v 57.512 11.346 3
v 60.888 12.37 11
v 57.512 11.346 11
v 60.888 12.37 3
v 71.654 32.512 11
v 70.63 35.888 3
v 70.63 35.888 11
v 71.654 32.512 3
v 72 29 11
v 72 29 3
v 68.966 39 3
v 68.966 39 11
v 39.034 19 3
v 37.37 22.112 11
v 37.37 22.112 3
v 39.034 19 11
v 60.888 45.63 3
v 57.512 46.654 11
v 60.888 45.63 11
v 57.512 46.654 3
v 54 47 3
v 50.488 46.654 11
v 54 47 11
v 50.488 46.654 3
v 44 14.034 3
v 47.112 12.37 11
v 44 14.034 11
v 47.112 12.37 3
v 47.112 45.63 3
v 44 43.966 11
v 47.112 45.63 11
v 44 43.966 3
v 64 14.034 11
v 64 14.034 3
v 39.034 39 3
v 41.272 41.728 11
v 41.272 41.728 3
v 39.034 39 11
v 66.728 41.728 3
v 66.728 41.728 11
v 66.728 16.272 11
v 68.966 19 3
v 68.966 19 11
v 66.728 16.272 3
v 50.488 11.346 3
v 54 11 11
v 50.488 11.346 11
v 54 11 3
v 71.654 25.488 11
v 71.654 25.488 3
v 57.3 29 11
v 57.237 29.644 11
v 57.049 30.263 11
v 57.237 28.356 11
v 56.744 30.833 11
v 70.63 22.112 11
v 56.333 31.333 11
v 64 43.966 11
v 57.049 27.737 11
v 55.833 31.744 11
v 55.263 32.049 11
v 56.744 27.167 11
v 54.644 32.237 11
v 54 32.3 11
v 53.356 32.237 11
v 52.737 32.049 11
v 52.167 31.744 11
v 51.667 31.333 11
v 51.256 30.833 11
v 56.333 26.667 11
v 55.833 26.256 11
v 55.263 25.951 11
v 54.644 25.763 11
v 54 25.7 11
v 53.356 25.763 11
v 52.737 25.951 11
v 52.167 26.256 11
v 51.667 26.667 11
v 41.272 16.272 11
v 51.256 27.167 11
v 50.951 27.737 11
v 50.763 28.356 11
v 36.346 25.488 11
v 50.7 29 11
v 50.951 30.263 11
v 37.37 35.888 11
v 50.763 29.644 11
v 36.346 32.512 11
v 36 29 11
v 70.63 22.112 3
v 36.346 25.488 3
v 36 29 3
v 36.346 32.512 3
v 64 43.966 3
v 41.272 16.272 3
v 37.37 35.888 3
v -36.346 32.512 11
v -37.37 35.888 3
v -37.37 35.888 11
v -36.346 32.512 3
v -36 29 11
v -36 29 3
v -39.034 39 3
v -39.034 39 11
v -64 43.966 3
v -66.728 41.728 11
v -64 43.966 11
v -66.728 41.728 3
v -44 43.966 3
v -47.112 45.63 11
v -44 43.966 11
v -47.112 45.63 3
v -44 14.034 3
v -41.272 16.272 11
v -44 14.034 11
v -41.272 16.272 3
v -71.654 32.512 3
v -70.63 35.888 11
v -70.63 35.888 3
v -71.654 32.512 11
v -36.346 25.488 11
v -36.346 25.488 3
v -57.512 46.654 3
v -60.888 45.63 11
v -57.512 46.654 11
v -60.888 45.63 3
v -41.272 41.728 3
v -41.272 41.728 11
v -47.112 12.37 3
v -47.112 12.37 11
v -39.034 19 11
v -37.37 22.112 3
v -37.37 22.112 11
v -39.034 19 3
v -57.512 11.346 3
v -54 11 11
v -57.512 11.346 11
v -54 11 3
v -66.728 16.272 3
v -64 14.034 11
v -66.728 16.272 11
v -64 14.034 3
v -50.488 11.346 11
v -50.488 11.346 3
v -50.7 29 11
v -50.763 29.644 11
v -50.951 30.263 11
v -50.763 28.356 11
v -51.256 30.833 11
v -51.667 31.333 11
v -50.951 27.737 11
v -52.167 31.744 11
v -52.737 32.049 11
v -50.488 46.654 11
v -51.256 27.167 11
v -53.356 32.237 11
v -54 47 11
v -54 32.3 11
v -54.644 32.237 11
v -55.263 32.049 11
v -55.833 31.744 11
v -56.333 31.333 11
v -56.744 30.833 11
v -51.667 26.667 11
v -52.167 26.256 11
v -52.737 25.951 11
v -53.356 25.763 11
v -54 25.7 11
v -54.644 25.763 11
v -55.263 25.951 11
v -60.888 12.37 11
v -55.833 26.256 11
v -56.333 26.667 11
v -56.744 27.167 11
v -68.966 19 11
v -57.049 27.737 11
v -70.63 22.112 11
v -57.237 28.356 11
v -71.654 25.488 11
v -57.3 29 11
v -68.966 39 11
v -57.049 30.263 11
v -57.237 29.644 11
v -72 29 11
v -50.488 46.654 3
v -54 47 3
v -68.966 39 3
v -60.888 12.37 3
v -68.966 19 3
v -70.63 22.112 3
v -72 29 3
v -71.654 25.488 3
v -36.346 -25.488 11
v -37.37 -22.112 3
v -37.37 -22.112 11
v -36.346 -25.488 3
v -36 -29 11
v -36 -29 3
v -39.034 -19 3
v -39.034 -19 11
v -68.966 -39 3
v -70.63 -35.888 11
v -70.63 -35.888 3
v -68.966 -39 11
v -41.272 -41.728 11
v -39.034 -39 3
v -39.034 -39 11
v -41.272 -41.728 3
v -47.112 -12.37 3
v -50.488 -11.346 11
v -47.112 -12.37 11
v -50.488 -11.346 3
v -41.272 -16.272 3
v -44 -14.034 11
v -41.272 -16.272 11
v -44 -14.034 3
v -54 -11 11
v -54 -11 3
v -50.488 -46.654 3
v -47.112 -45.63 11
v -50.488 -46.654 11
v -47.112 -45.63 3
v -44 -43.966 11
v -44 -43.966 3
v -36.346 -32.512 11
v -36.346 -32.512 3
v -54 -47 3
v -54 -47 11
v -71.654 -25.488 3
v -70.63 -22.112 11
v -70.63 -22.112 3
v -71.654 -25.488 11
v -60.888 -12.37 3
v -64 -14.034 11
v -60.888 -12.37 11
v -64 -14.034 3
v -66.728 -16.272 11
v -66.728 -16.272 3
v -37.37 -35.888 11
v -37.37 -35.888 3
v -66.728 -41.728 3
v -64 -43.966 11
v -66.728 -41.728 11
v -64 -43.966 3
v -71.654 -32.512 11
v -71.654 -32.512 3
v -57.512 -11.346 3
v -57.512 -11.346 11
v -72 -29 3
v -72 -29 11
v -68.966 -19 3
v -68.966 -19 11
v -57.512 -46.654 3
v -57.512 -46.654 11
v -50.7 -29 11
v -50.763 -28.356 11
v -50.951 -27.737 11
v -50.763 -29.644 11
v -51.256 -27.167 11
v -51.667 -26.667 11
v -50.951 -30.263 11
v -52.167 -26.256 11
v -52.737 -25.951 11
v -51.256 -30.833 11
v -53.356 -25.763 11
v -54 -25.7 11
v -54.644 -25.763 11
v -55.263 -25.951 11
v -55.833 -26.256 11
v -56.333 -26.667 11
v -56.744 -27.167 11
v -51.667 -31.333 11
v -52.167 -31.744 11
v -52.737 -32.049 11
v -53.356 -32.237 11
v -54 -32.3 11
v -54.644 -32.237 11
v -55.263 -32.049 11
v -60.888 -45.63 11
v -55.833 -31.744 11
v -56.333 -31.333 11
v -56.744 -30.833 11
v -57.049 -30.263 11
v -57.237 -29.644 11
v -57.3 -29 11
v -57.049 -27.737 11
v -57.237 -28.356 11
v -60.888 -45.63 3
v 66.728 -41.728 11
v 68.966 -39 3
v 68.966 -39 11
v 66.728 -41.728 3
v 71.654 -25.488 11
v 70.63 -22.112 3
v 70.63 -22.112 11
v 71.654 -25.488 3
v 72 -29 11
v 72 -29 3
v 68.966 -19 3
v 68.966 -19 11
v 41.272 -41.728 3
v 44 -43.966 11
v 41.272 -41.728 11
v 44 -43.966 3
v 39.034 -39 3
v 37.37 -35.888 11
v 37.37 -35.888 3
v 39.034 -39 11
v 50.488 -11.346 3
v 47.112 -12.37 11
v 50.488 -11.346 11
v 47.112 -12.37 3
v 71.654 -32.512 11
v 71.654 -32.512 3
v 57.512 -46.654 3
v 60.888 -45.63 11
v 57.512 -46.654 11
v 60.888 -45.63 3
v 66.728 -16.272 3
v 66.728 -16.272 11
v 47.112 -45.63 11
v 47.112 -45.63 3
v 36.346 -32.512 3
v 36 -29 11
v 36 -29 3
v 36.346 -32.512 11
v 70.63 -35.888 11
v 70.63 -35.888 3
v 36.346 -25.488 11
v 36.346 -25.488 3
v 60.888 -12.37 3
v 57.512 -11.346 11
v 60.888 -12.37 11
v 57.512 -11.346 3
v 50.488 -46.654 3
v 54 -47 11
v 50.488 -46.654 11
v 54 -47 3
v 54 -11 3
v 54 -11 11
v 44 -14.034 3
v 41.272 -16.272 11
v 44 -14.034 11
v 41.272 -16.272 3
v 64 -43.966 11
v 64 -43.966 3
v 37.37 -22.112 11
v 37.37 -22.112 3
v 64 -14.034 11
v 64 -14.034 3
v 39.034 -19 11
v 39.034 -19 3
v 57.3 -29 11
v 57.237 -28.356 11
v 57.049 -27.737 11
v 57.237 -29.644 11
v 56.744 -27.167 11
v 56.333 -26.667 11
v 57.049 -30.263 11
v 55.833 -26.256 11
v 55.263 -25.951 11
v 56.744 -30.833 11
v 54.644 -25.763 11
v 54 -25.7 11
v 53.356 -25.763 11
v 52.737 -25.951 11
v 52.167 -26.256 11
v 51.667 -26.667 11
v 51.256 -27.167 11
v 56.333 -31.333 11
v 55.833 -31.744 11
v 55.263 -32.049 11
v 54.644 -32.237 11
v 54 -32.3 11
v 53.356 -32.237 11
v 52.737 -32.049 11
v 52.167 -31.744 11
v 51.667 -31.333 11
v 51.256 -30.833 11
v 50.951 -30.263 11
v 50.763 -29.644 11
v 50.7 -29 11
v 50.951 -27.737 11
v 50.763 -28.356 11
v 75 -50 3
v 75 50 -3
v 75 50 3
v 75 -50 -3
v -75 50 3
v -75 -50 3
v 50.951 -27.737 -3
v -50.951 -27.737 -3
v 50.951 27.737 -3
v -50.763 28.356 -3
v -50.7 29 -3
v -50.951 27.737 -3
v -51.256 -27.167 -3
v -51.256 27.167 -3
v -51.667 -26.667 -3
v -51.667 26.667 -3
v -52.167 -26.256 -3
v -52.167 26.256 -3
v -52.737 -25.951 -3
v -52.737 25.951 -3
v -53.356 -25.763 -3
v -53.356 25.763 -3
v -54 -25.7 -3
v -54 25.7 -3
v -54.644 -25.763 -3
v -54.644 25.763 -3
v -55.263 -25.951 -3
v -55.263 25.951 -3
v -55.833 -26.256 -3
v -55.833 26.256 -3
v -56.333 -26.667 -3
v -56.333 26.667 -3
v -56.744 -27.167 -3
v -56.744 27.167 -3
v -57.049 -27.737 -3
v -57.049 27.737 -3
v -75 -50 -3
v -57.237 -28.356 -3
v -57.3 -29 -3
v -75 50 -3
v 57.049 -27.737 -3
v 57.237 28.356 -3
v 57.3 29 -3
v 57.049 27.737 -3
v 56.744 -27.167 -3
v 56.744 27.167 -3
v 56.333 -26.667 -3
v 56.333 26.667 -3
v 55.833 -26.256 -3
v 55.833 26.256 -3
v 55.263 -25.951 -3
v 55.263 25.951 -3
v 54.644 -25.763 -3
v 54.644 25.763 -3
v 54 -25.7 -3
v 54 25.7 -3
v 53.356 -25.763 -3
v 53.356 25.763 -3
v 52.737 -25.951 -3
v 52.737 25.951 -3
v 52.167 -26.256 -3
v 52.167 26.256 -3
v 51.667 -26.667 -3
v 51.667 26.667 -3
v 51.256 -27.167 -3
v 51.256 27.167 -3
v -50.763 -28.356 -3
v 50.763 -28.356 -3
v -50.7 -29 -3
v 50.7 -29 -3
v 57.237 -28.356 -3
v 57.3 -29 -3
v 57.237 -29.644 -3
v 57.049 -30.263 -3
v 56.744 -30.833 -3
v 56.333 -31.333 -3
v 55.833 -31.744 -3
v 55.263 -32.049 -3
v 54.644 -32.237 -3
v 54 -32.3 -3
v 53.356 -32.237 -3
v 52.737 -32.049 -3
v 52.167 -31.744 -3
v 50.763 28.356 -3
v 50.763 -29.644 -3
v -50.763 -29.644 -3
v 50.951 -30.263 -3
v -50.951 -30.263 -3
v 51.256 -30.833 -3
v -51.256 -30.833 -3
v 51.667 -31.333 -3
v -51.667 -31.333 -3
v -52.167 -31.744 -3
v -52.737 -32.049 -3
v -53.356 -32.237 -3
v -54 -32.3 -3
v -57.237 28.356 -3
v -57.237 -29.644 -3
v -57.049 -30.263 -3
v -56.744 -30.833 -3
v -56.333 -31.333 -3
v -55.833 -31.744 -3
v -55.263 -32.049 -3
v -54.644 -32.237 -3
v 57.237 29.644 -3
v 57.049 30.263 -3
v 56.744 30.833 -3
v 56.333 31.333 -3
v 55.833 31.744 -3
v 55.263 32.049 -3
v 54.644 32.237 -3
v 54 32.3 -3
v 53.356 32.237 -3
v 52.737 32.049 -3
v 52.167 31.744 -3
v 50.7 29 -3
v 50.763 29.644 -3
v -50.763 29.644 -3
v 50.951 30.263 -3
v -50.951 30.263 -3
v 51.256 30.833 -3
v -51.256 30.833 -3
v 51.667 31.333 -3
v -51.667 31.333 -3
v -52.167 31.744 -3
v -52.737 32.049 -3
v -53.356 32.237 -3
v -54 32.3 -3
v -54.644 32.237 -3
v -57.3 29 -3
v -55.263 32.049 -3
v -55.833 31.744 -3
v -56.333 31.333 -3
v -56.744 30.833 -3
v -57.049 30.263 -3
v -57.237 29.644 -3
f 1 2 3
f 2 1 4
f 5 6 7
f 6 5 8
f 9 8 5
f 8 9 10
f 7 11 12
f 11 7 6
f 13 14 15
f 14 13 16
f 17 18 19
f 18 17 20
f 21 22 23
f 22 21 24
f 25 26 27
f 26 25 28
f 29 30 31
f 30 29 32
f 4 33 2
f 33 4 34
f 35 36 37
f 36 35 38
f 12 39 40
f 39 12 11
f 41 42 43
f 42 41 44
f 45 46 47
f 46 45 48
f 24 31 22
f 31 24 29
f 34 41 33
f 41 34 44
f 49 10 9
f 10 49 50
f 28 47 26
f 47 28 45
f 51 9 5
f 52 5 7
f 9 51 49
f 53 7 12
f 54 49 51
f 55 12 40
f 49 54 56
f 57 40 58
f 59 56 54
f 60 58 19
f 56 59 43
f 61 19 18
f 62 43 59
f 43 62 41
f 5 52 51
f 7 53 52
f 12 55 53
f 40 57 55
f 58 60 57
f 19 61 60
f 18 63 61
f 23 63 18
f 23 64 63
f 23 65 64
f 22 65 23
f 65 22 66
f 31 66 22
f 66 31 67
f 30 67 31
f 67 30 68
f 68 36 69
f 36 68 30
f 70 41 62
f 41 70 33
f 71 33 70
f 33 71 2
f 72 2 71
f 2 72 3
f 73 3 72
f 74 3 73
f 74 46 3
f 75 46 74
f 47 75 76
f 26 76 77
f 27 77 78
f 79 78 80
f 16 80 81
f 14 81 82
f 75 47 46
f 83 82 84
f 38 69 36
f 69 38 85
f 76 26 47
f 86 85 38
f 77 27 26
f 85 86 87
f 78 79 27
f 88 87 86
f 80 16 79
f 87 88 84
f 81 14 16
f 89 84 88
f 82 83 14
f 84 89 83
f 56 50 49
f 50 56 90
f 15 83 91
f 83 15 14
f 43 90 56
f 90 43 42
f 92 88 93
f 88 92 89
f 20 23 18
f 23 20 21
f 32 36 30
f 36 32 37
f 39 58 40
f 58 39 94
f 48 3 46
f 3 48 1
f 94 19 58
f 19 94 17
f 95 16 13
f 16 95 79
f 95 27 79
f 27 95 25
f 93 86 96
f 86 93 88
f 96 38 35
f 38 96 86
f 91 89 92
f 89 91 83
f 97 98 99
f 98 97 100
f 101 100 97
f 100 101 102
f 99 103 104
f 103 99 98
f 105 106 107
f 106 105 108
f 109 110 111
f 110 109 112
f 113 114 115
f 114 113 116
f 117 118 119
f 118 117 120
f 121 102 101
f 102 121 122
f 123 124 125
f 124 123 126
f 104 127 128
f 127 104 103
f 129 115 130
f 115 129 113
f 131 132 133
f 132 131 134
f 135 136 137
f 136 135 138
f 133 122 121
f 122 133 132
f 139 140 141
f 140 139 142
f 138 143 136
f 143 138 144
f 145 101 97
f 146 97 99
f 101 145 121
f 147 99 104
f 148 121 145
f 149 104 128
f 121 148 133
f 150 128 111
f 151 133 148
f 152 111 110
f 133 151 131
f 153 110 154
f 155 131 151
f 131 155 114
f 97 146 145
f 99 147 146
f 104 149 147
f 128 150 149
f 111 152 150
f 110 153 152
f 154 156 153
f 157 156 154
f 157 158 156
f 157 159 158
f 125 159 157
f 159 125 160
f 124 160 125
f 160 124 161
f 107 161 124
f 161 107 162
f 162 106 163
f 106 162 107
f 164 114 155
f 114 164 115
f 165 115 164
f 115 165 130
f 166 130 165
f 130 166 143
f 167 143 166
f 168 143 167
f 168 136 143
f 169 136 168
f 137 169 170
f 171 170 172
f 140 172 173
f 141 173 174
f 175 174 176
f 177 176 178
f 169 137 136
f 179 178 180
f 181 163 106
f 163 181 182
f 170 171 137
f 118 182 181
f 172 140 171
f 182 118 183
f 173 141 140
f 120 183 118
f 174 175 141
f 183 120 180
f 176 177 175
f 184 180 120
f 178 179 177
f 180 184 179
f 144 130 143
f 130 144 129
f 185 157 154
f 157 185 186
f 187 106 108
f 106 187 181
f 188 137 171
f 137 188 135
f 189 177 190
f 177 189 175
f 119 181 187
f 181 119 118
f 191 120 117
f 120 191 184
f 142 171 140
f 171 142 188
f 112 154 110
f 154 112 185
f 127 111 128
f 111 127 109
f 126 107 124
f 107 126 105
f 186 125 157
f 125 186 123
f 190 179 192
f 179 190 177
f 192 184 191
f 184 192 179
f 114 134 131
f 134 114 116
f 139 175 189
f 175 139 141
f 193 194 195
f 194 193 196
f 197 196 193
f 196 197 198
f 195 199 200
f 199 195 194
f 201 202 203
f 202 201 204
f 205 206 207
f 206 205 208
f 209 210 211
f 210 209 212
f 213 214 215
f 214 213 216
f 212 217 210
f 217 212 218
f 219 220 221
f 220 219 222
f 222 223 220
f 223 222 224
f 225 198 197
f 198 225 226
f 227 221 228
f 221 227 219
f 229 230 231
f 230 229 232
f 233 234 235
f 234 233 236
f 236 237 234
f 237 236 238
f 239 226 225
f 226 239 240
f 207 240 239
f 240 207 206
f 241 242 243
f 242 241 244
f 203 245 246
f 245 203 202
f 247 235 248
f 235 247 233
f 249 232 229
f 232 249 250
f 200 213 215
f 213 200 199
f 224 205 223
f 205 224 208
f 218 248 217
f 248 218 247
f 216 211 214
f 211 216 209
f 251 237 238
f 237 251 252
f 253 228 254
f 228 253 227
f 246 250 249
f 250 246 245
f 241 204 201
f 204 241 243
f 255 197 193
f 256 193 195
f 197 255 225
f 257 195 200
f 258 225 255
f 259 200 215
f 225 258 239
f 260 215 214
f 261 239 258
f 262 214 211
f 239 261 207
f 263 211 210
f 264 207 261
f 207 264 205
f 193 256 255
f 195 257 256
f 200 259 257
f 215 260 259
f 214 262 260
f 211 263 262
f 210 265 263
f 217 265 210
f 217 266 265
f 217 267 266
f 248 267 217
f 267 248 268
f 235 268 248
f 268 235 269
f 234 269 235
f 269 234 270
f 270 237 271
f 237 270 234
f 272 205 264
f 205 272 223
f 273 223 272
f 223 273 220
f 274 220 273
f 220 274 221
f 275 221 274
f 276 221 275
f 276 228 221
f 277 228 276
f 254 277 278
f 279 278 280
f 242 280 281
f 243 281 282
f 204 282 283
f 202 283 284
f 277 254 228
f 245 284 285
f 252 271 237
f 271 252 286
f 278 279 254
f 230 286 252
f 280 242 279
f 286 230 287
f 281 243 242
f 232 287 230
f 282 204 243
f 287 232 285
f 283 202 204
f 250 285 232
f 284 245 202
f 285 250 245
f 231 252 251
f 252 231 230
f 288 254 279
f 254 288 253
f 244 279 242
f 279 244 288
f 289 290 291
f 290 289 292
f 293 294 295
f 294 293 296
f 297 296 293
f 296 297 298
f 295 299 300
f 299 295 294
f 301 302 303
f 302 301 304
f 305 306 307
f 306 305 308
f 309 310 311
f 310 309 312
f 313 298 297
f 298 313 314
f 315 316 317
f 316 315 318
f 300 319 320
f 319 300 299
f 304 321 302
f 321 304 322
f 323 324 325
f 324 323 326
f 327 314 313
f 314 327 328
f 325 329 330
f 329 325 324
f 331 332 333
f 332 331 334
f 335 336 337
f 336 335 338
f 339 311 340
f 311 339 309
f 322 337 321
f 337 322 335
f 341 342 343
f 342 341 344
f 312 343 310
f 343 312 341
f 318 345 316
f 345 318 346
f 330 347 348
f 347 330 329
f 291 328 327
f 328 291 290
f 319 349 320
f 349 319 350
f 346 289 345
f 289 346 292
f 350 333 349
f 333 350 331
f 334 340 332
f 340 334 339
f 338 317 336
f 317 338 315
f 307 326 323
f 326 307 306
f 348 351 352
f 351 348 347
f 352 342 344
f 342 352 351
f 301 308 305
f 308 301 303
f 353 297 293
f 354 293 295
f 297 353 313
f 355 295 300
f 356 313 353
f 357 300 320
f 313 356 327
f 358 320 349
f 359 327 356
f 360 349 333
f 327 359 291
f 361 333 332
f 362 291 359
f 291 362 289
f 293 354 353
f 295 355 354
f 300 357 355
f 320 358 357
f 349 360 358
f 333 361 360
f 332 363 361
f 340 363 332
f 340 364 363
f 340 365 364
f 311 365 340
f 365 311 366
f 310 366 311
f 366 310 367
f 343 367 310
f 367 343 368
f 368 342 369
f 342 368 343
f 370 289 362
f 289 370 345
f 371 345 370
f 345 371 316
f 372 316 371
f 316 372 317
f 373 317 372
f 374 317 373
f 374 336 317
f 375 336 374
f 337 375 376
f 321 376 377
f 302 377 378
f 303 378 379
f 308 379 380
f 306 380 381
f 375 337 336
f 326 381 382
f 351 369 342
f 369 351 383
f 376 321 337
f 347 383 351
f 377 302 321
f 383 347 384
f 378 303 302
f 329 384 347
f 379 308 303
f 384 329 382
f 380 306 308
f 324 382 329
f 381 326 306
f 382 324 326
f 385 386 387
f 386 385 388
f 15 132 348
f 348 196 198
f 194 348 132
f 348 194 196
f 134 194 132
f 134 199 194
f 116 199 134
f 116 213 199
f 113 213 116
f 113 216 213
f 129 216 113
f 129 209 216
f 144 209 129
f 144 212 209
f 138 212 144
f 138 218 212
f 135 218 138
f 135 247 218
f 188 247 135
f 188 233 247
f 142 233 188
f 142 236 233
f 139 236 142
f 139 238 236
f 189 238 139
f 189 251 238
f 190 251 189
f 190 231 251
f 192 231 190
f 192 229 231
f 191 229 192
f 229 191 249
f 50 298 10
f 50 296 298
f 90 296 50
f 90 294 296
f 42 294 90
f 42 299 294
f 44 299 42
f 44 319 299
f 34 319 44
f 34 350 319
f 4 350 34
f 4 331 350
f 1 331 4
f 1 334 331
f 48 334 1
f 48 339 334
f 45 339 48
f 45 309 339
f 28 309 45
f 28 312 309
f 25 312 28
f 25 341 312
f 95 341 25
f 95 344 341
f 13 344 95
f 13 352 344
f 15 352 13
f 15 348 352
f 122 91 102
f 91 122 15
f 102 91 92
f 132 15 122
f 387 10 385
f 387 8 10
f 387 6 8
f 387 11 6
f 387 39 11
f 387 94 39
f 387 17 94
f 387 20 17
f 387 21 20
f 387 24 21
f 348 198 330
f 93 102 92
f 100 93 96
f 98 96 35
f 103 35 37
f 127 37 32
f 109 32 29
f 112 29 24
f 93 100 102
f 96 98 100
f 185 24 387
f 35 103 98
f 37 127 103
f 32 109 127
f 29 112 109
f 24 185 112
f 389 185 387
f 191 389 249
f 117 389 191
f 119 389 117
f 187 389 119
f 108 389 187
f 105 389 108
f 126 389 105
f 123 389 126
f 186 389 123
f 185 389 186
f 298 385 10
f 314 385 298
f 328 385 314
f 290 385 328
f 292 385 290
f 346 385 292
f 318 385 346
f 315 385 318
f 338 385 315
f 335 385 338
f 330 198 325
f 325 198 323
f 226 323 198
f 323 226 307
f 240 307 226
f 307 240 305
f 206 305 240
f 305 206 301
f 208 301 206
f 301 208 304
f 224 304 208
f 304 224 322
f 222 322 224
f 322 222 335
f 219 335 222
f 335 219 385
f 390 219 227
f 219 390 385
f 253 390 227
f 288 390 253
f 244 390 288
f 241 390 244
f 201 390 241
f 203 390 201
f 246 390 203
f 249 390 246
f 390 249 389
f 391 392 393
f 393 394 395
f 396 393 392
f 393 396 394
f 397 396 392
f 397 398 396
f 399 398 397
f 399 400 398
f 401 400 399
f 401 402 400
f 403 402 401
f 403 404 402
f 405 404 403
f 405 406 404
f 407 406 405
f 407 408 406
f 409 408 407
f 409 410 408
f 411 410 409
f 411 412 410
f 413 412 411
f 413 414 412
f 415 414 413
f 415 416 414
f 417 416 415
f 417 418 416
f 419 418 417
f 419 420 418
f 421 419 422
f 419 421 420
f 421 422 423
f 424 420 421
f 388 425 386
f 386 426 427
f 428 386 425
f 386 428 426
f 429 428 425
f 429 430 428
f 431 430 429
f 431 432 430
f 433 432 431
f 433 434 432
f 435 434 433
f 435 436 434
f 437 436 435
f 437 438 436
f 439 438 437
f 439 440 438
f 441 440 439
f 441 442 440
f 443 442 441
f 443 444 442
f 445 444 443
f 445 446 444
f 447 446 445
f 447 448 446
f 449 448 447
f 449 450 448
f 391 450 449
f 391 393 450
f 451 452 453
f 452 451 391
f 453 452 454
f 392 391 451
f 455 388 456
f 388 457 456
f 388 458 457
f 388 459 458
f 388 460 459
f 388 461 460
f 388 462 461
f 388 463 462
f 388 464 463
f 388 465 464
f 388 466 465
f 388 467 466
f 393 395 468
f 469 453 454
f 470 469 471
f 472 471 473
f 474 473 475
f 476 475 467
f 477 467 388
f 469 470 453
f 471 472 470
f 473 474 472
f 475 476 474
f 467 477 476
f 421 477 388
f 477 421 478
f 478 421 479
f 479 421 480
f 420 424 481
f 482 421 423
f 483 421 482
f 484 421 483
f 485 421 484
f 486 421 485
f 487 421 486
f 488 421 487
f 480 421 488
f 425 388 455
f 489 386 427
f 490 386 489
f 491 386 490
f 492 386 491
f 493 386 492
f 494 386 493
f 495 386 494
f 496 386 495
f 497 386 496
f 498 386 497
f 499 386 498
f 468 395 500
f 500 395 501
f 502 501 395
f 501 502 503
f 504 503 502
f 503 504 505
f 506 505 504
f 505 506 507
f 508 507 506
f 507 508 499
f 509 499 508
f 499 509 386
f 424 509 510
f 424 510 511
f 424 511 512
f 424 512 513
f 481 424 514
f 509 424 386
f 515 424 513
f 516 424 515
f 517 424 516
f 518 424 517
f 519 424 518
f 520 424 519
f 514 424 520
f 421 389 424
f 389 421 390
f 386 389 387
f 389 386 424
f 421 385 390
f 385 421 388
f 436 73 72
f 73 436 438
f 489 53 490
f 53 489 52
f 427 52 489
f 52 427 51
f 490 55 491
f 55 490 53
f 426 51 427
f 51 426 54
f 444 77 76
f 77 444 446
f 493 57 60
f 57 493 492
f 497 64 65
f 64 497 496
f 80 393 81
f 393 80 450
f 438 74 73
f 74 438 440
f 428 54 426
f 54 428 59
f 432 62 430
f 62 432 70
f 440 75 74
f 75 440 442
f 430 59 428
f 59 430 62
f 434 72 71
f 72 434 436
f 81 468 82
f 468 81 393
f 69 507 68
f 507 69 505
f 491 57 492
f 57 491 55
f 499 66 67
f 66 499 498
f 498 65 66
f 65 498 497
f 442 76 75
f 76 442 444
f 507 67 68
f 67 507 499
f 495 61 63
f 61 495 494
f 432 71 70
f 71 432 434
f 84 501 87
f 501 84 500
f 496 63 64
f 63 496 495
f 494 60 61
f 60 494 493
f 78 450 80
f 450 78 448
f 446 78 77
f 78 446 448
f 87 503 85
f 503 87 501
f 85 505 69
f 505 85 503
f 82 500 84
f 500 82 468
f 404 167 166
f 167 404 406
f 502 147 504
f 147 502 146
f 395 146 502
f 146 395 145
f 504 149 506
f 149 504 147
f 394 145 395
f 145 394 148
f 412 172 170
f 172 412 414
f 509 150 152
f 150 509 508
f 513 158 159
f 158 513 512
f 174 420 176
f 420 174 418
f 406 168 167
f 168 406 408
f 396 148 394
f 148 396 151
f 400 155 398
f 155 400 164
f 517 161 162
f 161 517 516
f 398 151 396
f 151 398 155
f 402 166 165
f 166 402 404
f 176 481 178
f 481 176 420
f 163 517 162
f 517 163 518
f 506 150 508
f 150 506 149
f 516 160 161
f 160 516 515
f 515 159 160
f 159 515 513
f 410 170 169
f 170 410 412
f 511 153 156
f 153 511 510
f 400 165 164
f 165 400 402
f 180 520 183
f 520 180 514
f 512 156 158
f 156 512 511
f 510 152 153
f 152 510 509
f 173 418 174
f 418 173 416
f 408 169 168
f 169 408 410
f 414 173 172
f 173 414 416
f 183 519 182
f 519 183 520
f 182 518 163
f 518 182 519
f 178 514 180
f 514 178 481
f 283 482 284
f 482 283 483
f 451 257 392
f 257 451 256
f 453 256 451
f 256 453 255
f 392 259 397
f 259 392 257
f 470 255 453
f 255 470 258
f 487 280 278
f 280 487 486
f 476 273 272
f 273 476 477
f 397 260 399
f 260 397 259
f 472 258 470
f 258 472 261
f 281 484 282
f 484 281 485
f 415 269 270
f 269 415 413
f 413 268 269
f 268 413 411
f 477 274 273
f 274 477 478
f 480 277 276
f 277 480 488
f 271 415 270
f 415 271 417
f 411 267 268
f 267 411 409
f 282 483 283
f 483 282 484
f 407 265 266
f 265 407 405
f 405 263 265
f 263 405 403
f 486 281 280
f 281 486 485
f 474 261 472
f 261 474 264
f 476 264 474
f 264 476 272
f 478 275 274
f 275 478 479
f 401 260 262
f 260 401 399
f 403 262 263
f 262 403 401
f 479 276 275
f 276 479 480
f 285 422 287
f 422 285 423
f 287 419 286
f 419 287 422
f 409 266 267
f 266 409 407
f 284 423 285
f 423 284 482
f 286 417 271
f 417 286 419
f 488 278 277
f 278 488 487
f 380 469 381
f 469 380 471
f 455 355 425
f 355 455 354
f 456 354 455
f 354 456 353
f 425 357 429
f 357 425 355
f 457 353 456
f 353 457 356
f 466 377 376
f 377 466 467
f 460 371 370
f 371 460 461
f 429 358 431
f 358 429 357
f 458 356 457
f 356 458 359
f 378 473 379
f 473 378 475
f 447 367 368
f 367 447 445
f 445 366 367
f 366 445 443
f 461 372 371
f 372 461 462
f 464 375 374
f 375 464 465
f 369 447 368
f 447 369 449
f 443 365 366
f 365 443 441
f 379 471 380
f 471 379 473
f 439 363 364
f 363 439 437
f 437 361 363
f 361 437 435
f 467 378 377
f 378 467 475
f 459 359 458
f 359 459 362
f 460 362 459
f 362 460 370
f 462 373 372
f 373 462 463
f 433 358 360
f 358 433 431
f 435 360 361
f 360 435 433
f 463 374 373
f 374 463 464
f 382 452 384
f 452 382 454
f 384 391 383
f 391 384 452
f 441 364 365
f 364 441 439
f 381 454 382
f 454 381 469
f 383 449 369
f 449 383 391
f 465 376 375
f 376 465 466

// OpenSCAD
$fn = 32;

// ----------------------------------------------------------------------
// Anchor pads 150 x 100 x 14
// four corner bosses with anchor holes
// ----------------------------------------------------------------------

// --- parameters (mm) ---
plate = [150, 100, 6];  // base plate size (x, y, z)
pads = 4;               // boss count, one per corner
edge = 21;              // boss centre offset from the plate edge
boss_d = 36;            // boss diameter
boss_h = 8;             // boss height above the base plate
hole_d = 6.6;           // hole diameter

// --- derived feature positions (mm) ---
height = plate[2] + boss_h;      // = 14   overall height of the part
corner_x = plate[0] / 2 - edge;  // = 54   boss centre X
corner_y = plate[1] / 2 - edge;  // = 29   boss centre Y
feature_centers = [
  [corner_x, corner_y],
  [-corner_x, corner_y],
  [-corner_x, -corner_y],
  [corner_x, -corner_y]
];   // boss centres, anchor holes are drilled there

// base plate, four bosses standing on it, anchor holes all the way through
difference() {
  union() {
    cube(plate, center = true);
    for (centre = feature_centers)
      translate([centre[0], centre[1], plate[2] / 2 - 1])
        cylinder(d = boss_d, h = boss_h + 1);
  }
  for (centre = feature_centers)
    translate([centre[0], centre[1], -height])
      cylinder(d = hole_d, h = 2 * height + 2);  // through boss and plate
}
